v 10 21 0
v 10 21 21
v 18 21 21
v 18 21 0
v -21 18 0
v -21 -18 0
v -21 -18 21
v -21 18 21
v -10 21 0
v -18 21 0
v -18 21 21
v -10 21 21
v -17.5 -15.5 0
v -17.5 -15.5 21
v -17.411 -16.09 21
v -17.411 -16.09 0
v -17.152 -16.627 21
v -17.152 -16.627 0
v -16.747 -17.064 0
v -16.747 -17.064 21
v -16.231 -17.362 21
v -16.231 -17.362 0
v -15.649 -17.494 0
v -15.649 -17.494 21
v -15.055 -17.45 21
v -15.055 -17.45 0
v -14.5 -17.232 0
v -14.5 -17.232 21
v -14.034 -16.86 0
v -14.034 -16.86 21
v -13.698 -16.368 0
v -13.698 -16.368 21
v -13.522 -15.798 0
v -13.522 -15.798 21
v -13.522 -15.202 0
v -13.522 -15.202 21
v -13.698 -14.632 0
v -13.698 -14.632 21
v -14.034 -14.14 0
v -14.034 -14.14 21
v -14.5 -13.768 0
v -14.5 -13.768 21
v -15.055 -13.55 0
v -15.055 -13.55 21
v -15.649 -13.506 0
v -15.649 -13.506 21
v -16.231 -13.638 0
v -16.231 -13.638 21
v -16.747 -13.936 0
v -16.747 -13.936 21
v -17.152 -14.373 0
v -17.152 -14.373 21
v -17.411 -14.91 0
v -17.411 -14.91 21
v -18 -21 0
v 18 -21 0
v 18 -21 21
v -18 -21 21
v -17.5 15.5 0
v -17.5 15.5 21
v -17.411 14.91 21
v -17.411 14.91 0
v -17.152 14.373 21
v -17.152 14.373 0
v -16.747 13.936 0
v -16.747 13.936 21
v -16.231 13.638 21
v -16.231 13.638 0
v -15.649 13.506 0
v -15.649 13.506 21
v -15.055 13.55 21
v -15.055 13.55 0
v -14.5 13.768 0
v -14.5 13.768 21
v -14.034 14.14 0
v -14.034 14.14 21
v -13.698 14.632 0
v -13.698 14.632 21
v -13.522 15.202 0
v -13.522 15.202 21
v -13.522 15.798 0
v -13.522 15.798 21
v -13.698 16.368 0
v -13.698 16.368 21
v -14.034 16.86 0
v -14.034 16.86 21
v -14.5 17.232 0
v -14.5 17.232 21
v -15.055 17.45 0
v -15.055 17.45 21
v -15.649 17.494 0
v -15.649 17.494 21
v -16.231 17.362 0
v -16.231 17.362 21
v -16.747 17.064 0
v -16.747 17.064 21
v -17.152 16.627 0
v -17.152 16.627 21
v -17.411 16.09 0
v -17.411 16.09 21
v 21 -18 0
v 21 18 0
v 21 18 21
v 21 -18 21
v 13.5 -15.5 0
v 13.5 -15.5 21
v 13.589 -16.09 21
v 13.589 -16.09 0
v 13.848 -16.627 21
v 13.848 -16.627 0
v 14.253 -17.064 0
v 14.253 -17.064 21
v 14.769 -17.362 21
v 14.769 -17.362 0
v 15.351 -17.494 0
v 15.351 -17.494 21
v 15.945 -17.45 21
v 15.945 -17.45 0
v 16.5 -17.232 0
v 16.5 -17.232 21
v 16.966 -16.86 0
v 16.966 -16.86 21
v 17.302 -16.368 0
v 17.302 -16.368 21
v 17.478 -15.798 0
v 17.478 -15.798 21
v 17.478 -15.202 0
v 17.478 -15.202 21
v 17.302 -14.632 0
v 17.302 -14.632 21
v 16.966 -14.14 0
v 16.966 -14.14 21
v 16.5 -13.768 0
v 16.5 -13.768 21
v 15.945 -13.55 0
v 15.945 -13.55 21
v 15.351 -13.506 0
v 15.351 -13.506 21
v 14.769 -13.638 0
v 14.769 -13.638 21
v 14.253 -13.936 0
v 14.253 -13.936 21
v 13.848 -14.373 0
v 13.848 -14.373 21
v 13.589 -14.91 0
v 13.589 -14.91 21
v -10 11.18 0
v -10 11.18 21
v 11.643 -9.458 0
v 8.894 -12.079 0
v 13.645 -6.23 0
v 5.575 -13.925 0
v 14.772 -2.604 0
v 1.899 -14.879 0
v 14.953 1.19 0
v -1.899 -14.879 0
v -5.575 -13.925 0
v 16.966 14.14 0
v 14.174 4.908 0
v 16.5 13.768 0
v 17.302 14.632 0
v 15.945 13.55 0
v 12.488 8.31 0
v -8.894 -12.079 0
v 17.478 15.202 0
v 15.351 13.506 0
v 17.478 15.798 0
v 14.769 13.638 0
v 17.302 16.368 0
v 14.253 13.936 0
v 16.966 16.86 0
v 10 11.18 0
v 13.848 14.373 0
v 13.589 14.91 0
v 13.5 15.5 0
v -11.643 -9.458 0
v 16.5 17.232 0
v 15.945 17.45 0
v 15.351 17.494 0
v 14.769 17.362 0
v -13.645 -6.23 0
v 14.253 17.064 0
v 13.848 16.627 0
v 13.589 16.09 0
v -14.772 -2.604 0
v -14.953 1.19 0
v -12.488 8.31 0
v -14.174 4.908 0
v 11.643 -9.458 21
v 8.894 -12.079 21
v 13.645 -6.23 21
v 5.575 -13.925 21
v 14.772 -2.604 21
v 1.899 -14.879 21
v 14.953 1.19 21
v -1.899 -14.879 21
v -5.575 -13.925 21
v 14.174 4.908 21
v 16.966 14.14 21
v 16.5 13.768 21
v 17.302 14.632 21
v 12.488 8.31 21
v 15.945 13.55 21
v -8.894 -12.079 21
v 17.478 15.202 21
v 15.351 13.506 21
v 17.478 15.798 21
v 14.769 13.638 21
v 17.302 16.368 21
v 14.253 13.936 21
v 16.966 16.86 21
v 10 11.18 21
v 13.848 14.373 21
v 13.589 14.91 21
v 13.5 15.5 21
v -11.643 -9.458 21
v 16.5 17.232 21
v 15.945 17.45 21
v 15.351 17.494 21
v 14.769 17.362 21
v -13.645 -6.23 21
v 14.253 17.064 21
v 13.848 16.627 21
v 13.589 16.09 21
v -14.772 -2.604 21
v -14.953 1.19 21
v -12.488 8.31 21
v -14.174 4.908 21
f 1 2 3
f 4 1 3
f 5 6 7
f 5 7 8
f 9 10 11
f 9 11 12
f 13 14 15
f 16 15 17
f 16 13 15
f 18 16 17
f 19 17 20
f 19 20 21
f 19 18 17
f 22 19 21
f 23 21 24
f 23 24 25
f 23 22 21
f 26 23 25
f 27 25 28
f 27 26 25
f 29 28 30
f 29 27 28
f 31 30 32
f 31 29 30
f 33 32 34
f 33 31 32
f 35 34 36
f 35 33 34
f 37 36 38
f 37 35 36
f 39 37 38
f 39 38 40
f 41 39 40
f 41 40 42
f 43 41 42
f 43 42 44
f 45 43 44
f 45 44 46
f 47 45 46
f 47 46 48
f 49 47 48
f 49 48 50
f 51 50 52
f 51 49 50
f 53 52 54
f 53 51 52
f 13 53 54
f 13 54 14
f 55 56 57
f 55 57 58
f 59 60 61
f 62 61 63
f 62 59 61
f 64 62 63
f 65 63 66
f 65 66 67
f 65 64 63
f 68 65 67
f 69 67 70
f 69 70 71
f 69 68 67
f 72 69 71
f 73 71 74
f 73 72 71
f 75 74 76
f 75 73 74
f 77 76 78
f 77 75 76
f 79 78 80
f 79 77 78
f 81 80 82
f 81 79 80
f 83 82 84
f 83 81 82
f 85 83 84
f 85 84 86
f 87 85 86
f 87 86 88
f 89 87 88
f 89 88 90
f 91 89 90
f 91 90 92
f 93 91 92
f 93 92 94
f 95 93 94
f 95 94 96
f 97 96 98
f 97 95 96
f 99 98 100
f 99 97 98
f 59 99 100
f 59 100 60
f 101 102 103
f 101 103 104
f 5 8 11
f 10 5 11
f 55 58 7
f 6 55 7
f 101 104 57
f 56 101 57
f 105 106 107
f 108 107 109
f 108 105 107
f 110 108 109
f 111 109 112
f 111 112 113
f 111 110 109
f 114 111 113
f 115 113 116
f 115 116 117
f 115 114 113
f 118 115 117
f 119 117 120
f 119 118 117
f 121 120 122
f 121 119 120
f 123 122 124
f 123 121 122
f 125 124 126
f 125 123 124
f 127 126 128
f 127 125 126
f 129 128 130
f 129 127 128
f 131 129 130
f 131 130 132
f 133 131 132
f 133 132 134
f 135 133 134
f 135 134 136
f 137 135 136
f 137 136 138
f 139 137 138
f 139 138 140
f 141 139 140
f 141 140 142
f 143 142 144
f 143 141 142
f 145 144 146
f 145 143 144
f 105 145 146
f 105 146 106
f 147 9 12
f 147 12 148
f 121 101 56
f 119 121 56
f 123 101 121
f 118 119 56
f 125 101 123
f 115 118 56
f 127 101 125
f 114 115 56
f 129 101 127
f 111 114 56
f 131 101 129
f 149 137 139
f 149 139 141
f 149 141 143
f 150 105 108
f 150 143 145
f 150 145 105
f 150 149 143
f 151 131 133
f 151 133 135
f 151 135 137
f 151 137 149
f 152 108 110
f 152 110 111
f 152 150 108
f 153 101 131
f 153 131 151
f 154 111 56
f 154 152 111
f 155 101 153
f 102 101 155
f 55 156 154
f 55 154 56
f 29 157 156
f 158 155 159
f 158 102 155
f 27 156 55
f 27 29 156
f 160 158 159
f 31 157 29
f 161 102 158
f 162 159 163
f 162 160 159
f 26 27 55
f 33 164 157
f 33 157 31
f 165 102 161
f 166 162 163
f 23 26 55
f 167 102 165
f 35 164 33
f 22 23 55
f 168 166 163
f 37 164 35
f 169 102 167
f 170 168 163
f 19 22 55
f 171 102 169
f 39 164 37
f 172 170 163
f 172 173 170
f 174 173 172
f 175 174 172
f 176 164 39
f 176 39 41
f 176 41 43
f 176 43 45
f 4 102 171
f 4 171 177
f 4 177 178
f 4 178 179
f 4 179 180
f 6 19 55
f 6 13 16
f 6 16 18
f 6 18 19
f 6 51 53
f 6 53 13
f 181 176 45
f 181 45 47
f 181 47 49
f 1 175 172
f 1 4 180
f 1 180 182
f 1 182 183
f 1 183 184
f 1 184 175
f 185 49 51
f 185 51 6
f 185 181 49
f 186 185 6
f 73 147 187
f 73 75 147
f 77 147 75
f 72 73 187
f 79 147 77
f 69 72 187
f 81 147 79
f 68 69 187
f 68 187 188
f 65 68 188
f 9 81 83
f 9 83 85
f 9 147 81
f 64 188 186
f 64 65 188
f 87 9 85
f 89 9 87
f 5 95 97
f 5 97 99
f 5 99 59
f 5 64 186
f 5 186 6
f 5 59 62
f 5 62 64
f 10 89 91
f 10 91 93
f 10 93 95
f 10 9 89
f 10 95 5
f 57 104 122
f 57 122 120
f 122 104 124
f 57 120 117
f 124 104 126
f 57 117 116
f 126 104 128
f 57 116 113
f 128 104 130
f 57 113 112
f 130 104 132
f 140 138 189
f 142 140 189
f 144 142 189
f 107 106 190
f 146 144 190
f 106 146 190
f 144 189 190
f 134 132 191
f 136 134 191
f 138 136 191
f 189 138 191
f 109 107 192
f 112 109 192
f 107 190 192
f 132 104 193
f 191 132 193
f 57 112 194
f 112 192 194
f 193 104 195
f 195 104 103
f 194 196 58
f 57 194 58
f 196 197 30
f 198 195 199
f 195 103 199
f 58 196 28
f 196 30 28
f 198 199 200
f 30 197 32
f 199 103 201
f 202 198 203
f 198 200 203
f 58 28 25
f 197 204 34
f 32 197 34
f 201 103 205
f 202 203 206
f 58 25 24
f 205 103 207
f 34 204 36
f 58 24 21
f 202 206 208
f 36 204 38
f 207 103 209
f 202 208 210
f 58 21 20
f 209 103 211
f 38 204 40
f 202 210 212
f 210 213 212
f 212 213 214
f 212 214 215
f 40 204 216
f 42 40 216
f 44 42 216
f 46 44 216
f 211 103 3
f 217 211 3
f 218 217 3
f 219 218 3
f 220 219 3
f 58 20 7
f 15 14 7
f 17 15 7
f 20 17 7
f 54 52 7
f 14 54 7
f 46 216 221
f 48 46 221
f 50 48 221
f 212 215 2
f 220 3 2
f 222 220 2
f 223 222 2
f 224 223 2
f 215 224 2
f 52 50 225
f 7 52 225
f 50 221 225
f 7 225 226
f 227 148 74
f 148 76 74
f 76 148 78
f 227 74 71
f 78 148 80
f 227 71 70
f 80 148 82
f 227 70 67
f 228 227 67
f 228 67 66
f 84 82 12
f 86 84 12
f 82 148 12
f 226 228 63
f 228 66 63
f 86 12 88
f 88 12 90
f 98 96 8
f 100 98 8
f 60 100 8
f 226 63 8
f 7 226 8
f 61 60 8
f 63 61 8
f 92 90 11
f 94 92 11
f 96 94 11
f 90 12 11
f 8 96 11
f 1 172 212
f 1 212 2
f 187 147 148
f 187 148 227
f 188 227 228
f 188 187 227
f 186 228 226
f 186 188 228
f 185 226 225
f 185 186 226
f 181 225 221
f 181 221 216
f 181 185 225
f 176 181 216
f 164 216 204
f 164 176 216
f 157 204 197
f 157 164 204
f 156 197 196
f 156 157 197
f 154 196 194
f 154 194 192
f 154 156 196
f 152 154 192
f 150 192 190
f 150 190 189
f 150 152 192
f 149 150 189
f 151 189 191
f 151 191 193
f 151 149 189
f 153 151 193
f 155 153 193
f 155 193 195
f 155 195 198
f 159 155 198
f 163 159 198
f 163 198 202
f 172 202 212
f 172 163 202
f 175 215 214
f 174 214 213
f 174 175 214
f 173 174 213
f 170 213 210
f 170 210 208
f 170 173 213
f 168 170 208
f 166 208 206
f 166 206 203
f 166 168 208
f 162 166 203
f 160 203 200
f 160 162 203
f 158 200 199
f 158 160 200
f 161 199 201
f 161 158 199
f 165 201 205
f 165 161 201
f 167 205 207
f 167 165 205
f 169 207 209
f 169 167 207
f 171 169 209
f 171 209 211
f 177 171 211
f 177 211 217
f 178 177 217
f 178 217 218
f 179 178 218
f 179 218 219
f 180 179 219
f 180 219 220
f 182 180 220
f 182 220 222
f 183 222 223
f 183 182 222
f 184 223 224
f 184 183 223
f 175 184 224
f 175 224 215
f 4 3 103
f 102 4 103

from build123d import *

# Parameters (mm, degrees)
SKETCH_1_R      = 2
EXTRUDE_1_DEPTH = 21


with BuildPart() as part:
    # 草图1 → 凸台-拉伸1 (new body)
    with BuildSketch(Plane.XY):
        with BuildLine():
            Line((-21, 18), (-18, 21))
            Line((-18, 21), (-10, 21))
            Line((-10, 21), (-10, 11.180339887))
            ThreePointArc((-10, 11.180339887), (0, -15), (10, 11.180339887))
            Line((10, 11.180339887), (10, 21))
            Line((10, 21), (18, 21))
            Line((18, 21), (21, 18))
            Line((21, 18), (21, -18))
            Line((21, -18), (18, -21))
            Line((18, -21), (-18, -21))
            Line((-18, -21), (-21, -18))
            Line((-21, -18), (-21, 18))
        make_face()
        with Locations(Location((15.5, 15.5, 0), (0, 0, 180))):
            Circle(SKETCH_1_R, mode=Mode.SUBTRACT)
        with Locations(Location((15.5, -15.5, 0), (0, 0, 180))):
            Circle(SKETCH_1_R, mode=Mode.SUBTRACT)
        with Locations(Location((-15.5, -15.5, 0), (0, 0, 180))):
            Circle(SKETCH_1_R, mode=Mode.SUBTRACT)
        with Locations(Location((-15.5, 15.5, 0), (0, 0, 180))):
            Circle(SKETCH_1_R, mode=Mode.SUBTRACT)
    extrude(amount=EXTRUDE_1_DEPTH)


solid = part.part
